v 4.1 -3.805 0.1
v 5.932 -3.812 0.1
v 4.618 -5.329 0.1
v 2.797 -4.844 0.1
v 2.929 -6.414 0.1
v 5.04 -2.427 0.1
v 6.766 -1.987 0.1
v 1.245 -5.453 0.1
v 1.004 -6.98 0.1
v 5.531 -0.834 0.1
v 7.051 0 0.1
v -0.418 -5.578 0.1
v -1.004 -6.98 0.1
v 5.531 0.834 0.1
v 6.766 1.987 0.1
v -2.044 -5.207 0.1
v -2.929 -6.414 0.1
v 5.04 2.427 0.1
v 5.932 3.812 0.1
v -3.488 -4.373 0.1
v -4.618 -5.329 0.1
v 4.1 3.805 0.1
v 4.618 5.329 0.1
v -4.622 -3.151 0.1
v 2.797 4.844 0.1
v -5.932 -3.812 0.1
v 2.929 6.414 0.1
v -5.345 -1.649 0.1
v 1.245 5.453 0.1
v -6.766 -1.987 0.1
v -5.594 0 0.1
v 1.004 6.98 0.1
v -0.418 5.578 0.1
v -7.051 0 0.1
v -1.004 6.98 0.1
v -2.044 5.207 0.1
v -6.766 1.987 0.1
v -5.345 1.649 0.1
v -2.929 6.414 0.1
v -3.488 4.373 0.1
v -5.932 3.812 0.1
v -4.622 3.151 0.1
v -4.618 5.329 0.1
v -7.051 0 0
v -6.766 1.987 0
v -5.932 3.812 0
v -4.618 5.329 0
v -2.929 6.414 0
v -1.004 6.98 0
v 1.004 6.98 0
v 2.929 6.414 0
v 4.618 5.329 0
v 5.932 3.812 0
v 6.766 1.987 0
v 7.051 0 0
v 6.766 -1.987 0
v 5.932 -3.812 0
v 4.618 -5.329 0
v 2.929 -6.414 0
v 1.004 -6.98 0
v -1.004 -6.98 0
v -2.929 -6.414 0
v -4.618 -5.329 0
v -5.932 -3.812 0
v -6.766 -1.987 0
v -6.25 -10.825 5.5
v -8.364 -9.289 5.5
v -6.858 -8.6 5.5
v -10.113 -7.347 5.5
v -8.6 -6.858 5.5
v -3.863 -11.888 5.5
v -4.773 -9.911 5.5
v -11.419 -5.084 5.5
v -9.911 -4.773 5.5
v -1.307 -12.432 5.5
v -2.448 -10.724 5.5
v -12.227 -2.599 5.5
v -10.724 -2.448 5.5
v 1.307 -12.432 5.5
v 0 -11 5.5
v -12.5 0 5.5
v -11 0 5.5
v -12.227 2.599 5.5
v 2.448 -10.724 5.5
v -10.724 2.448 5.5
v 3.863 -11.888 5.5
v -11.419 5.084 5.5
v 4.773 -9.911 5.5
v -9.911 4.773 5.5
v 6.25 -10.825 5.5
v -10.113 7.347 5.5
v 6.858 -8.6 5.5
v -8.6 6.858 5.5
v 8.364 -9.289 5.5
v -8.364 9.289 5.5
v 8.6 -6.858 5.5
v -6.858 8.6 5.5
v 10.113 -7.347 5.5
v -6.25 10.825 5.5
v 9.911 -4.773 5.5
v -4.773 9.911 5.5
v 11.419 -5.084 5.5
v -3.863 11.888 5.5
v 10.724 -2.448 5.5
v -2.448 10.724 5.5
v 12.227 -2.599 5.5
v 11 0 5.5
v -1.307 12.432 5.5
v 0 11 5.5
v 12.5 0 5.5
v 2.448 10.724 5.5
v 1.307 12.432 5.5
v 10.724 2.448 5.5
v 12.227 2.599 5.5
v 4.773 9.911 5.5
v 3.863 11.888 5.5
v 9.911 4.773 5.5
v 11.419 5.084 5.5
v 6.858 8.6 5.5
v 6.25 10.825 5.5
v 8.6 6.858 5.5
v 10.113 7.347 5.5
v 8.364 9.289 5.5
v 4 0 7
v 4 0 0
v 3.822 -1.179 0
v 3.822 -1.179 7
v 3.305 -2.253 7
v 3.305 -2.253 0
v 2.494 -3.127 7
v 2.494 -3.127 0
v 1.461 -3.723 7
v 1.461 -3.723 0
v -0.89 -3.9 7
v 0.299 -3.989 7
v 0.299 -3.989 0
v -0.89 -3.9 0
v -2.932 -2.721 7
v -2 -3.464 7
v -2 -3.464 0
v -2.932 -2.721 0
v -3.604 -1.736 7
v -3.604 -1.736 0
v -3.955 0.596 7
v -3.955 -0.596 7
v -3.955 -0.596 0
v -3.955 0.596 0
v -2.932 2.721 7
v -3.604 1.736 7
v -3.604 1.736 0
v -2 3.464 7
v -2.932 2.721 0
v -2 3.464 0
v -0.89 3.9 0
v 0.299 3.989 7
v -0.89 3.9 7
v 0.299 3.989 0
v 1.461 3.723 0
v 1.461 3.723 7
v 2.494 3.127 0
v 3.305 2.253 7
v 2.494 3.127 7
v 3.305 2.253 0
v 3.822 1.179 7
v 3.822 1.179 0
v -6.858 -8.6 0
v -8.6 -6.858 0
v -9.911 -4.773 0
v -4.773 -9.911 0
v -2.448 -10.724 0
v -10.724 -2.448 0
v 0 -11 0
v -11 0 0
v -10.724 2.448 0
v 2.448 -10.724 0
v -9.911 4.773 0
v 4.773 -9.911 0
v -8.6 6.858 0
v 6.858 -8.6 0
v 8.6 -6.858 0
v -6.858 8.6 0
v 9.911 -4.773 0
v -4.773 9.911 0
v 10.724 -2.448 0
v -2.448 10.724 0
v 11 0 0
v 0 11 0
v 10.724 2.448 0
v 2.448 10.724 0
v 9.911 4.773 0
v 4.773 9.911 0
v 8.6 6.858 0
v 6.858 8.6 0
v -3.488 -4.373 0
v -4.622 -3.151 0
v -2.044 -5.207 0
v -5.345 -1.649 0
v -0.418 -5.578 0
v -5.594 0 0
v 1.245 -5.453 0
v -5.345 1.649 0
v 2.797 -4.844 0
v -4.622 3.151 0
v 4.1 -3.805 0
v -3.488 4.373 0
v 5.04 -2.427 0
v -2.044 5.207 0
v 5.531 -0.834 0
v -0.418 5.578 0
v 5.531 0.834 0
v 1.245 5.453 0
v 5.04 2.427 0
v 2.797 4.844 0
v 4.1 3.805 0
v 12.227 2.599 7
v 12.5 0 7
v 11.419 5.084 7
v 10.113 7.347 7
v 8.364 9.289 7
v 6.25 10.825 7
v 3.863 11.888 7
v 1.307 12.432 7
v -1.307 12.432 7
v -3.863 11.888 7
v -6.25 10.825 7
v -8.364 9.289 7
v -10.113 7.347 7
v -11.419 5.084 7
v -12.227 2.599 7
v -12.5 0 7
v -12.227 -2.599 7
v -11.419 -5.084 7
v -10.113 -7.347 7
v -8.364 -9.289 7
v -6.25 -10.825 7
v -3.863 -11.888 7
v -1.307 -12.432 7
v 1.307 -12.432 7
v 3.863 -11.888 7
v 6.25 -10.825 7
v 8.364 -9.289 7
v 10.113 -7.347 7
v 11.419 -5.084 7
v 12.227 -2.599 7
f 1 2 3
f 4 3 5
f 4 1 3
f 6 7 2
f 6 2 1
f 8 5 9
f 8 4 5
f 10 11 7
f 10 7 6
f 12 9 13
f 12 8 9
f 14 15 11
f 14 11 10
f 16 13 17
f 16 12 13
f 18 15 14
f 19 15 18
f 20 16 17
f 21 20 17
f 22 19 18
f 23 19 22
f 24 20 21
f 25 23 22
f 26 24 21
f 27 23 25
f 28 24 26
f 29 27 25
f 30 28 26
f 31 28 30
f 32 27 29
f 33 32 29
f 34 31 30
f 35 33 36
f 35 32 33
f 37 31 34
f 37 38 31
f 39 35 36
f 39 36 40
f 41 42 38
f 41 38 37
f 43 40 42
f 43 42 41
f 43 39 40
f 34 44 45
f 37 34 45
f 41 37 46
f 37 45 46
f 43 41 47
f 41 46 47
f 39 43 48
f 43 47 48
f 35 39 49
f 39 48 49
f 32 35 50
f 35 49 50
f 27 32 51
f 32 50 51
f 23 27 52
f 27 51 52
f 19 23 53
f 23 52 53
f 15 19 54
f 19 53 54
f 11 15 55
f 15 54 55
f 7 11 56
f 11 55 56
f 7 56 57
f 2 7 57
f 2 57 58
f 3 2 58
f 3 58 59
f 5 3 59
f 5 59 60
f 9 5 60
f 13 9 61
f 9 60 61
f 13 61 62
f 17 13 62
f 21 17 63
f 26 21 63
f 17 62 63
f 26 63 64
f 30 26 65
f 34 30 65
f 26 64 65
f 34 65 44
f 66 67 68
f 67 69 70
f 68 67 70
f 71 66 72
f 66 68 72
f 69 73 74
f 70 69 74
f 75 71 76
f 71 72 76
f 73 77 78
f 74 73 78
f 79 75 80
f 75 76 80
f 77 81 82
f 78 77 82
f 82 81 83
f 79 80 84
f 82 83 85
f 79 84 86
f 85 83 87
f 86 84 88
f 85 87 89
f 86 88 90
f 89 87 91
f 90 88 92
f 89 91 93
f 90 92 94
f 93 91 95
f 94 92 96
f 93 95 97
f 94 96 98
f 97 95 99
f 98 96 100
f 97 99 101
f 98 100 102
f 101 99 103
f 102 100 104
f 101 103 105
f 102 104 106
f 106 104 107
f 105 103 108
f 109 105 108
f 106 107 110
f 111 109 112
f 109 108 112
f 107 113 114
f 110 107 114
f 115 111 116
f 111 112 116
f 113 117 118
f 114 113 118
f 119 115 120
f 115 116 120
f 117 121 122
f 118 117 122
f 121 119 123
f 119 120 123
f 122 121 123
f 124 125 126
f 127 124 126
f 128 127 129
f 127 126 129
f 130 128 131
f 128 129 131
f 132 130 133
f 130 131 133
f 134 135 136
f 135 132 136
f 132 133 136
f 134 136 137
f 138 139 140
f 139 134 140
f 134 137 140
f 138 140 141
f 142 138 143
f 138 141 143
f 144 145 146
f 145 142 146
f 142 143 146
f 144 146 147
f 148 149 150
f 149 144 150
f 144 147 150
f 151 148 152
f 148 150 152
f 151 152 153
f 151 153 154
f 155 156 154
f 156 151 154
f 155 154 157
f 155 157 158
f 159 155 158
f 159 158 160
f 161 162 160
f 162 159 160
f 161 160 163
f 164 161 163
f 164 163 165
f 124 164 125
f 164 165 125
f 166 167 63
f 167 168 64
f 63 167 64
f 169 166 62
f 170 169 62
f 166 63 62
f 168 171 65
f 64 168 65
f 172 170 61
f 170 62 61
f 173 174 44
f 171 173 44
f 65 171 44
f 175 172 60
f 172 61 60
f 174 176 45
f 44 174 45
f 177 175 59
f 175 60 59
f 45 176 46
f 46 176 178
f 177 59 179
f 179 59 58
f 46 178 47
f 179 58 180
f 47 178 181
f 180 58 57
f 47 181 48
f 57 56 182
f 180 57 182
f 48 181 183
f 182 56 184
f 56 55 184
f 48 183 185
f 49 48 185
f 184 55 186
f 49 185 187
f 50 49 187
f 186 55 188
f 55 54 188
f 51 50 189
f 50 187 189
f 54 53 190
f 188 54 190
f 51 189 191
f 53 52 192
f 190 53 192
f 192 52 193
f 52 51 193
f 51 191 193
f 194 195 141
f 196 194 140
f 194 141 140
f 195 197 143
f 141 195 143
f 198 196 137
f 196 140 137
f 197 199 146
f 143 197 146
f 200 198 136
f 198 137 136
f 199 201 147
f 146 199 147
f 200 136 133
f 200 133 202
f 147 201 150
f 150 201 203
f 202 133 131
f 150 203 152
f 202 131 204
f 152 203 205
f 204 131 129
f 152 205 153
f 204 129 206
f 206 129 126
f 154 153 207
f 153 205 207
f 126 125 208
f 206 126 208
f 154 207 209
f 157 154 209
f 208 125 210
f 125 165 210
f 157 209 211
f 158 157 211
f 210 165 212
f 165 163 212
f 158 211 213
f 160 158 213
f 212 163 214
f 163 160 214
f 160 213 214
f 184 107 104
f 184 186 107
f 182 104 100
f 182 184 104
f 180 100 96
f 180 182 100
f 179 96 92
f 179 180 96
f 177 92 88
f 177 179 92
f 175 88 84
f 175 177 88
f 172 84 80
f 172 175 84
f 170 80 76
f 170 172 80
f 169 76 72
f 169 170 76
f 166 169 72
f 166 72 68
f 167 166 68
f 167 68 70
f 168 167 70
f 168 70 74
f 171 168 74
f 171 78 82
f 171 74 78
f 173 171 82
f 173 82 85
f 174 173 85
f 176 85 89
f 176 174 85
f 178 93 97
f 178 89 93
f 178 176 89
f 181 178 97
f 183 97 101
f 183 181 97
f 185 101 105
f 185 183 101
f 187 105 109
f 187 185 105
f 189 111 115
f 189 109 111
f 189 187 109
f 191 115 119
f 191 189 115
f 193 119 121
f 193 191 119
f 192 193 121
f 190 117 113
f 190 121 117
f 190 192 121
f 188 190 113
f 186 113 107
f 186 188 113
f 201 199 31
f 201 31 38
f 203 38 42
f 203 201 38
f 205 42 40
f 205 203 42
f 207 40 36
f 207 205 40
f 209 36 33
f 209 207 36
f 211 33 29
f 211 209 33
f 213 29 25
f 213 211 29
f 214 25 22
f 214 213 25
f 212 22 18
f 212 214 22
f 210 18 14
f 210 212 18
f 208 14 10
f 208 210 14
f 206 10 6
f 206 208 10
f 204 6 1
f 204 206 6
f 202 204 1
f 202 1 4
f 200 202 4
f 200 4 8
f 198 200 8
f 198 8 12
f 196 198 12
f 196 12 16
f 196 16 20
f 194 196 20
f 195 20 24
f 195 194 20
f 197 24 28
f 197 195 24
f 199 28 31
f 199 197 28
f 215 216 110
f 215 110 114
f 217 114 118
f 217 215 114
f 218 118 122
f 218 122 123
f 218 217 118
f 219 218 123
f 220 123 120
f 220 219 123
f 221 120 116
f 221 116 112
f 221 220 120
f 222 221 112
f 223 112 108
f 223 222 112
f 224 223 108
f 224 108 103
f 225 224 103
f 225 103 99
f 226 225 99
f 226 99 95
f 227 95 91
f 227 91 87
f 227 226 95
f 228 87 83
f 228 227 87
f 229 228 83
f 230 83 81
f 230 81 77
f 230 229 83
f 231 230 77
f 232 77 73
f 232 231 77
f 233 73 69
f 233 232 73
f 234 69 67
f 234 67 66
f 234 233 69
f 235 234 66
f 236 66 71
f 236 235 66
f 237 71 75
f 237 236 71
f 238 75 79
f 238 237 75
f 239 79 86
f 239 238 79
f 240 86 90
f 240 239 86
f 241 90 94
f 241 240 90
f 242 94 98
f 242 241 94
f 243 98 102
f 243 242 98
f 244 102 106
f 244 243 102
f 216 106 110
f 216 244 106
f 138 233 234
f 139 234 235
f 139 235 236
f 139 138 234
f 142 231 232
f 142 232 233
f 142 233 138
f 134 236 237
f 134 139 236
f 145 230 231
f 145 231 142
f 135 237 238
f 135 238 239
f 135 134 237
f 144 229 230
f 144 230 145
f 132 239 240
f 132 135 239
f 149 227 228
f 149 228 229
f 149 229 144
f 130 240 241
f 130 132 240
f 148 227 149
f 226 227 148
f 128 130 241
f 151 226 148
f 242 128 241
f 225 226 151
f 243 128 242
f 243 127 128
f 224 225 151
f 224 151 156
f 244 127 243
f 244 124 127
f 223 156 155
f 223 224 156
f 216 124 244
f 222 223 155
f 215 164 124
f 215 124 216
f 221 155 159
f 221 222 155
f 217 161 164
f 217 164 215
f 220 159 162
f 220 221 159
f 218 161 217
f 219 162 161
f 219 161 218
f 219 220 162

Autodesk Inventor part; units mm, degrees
ref_plane "YZ Plane" through (0, 0, 0) normal (1, 0, 0) x (0, 1, 0)
ref_plane "XZ Plane" through (0, 0, 0) normal (0, 1, 0) x (-1, 0, 0)
ref_plane "XY Plane" through (0, 0, 0) normal (0, 0, 1) x (1, 0, 0)
sketch "Sketch1" plane through (0, 0, 0) normal (0, 0, 1) x (1, 0, 0)
  circle A0 centre (0, 0) radius 4
  circle A1 centre (0, 0) radius 11
  dimension "d0" = 8
  dimension "d1" = 22
extrude "Extrusion1" add sketch "Sketch1" along normal blind 7
sketch "Sketch2" plane through (0, 0, 7) normal (0, 0, 1) x (1, 0, 0)
  circle A0 centre (0, 0) radius 11 projected
  circle A1 centre (0, 0) radius 12.5
  dimension "d4" = 25
extrude "Extrusion2" add sketch "Sketch2" against normal blind 1.5
sketch "Sketch3" plane through (0, 0, 0) normal (0, 0, -1) x (-1, 0, 0)
  circle A0 centre (0, 0) radius 11 projected
  circle A1 centre (0, 0) radius 5.5937
  circle A2 centre (0, 0) radius 7.0513
extrude "Extrusion3" cut sketch "Sketch3" against normal blind 0.1 contours A2
properties part number "30169-01" material "Steel, Mild"
